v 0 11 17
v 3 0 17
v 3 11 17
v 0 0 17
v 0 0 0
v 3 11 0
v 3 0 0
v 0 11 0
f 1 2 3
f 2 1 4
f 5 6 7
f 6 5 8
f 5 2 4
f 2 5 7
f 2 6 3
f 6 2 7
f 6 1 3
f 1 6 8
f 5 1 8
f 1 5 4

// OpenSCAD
// Generated by SolidPython 1.0.1 on 2020-07-29 00:46:54


cube(size = [3, 11, 17]);
/***********************************************
*********      SolidPython code:      **********
************************************************
 
# import packages: SolidPython
from solid import *
from solid.utils import *
from itertools import chain, combinations, permutations


class Resize:

    def __init__(self, scad_file):
        self.scad_file = scad_file
        #self.scad_file = import_scad(scad_file)
        # cone/cylinder param:
        self.r1 = 0
        self.r2 = 0
        self.h = 0
        # rectangular prism param:
        self.w = 0
        self.l = 0
        # ellipse param:
        self.r = 0

    # import OpenScad code (file name corresponds to shape)


    # classify shape + parameters
    def assign(self, param1, param2, param3):
        if self.scad_file == 'cone.scad':
            self.r1 = param1
            self.r2 = param2
            self.h = param3
        elif self.scad_file == 'cylinder.scad':
            self.r1 = param1
            self.r2 = param2
            self.h = param3
        elif self.scad_file == 'rectangularPrism.scad':
            self.h = param1
            self.l = param2
            self.w = param3
        else:
            self.r = param1
            self.h = param2

    # resize parameters
    def iterate(self):
        x = range(3, 20, 2)
        i = 1
        if self.scad_file == 'cone.scad':
            tempList = list(permutations(x, 2))
            for temp in tempList:
                param1 = temp[0]
                param2 = temp[1]
                filepath = 'produced_scad_files/' + 'cone' + str(param1) + '_' + str(param2) + '_' + '.scad'
                scad_render_to_file(cylinder(h=param1, r1=param2, r2=0), filepath)

        elif self.scad_file == 'cylinder.scad':
            tempList = list(permutations(x, 3))
            for temp in tempList:
                param1 = temp[0]
                param2 = temp[1]
                filepath = 'produced_scad_files/' + 'cylinder' + str(param1) + '_' + str(param2) + '_' + '.scad'
                scad_render_to_file(cylinder(h=param1, r1=param2, r2=param2), filepath)

        elif self.scad_file == 'rectangularPrism.scad':
            tempList = list(permutations(x, 3))
            for temp in tempList:
                param1 = temp[0]
                param2 = temp[1]
                param3 = temp[2]
                filepath = 'produced_scad_files/' + 'rectangularPrism' + str(param1) + '_' + str(param2) + '_' + str(
                    param3) + '.scad'
                scad_render_to_file(cube(size=(param1, param2, param3)), filepath)

        elif self.scad_file == 'ellipse.scad':
            tempList = list(permutations(x, 4))
            for temp in tempList:
                param1 = temp[0]
                param2 = temp[1]
                param3 = temp[2]
                param4 = temp[3]
                filepath = 'produced_scad_files/' + 'ellipse' + str(param1) + '_' + str(param2) + '_' + str(param3) + '_' + str(param4) + '.scad'
                scad_render_to_file(scale([param1, param2, param3])(sphere(r=param4)), filepath)

    def render_to_scadfile(self):
        scad_render_to_file(scad, 'example.scad') 
 
************************************************/
